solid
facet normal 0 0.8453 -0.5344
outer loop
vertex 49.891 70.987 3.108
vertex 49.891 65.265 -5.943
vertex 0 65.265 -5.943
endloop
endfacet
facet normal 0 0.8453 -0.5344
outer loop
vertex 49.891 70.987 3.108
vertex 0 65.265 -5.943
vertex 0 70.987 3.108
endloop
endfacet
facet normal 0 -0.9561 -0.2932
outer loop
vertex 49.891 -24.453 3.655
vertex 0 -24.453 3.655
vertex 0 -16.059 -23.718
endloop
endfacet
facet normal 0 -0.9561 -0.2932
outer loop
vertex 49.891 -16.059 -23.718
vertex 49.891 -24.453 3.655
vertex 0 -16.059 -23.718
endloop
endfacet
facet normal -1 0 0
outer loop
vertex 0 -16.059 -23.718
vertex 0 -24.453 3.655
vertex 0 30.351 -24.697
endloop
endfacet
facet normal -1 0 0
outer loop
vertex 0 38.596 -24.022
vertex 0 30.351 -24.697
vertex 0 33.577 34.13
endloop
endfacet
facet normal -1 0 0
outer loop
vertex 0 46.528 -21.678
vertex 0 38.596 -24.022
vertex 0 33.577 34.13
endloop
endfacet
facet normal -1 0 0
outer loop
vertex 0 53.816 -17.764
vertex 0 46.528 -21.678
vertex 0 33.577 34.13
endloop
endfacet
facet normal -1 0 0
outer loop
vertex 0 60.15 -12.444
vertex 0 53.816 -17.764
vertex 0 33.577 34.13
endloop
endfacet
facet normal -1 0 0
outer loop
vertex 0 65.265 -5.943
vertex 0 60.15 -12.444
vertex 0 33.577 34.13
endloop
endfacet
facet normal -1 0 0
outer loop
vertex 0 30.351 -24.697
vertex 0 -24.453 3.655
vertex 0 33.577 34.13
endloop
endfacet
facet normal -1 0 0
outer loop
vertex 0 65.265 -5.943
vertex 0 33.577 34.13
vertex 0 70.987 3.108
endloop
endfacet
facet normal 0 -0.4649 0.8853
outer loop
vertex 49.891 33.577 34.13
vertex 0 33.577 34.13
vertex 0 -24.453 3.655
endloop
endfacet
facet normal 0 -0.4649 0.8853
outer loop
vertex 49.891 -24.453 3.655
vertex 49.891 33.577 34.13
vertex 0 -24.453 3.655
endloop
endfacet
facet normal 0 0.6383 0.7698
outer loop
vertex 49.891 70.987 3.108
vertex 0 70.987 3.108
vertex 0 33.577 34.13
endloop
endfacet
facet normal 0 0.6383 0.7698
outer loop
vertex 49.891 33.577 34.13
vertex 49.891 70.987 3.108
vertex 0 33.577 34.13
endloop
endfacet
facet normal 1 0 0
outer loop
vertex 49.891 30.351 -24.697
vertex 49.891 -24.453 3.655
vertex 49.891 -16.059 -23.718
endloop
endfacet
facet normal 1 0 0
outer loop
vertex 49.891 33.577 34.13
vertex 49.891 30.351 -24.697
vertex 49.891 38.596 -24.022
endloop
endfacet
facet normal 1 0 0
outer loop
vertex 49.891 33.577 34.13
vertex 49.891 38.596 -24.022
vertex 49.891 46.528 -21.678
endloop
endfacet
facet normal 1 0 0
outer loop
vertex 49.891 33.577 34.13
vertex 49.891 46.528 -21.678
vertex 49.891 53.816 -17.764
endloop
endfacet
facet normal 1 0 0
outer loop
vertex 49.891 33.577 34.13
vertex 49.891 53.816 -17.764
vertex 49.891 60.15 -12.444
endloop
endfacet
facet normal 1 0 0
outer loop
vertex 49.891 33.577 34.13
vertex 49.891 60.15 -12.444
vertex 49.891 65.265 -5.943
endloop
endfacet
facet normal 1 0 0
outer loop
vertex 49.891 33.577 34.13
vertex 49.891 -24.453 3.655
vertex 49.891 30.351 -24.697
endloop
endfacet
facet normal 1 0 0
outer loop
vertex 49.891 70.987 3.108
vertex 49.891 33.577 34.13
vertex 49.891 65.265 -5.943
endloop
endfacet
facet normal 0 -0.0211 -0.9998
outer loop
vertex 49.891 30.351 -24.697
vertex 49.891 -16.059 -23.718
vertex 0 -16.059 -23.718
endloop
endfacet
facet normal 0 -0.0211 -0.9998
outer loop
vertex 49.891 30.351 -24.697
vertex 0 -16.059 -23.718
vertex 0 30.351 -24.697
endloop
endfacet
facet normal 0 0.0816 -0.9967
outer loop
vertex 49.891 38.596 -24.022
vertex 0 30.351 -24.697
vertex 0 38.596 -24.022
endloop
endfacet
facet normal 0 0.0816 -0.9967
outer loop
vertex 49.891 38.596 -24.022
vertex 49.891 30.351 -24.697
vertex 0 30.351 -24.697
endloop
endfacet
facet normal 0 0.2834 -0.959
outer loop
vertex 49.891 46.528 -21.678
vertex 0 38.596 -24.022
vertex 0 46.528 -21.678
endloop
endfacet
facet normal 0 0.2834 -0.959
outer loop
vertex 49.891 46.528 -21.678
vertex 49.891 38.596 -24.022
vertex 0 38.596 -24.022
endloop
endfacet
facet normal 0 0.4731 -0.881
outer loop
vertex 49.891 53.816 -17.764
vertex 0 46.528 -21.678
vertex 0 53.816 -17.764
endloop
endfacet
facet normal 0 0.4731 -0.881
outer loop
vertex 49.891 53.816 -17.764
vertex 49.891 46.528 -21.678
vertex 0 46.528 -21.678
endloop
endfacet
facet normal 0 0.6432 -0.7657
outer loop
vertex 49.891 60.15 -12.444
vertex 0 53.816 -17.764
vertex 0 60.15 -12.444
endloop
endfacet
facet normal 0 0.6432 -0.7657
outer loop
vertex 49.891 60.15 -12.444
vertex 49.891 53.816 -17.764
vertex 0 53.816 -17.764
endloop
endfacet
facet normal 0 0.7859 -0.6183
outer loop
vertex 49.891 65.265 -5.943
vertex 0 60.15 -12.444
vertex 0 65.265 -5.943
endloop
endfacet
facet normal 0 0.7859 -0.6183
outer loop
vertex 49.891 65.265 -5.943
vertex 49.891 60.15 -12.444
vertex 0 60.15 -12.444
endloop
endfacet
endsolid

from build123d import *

# Parameters (mm, degrees)
F1_DEPTH = 49.8911
F2_R     = 40.29989


with BuildPart() as f1:
    # F0 (on Right) → F1 (new body)
    with BuildSketch(Plane.YZ):
        Polygon((33.577301, 34.130178), (-24.453036, 3.655124), (-16.058711, -23.717679), (53.103238, -25.177559), (70.986792, 3.107668), align=None)
    extrude(amount=F1_DEPTH)

    # F2
    f2_edges = [f1.edges().sort_by_distance(p)[0] for p in [
        (24.94555, 53.103238, -25.177559),
    ]]
    fillet(f2_edges, radius=F2_R)


solid = f1.part
